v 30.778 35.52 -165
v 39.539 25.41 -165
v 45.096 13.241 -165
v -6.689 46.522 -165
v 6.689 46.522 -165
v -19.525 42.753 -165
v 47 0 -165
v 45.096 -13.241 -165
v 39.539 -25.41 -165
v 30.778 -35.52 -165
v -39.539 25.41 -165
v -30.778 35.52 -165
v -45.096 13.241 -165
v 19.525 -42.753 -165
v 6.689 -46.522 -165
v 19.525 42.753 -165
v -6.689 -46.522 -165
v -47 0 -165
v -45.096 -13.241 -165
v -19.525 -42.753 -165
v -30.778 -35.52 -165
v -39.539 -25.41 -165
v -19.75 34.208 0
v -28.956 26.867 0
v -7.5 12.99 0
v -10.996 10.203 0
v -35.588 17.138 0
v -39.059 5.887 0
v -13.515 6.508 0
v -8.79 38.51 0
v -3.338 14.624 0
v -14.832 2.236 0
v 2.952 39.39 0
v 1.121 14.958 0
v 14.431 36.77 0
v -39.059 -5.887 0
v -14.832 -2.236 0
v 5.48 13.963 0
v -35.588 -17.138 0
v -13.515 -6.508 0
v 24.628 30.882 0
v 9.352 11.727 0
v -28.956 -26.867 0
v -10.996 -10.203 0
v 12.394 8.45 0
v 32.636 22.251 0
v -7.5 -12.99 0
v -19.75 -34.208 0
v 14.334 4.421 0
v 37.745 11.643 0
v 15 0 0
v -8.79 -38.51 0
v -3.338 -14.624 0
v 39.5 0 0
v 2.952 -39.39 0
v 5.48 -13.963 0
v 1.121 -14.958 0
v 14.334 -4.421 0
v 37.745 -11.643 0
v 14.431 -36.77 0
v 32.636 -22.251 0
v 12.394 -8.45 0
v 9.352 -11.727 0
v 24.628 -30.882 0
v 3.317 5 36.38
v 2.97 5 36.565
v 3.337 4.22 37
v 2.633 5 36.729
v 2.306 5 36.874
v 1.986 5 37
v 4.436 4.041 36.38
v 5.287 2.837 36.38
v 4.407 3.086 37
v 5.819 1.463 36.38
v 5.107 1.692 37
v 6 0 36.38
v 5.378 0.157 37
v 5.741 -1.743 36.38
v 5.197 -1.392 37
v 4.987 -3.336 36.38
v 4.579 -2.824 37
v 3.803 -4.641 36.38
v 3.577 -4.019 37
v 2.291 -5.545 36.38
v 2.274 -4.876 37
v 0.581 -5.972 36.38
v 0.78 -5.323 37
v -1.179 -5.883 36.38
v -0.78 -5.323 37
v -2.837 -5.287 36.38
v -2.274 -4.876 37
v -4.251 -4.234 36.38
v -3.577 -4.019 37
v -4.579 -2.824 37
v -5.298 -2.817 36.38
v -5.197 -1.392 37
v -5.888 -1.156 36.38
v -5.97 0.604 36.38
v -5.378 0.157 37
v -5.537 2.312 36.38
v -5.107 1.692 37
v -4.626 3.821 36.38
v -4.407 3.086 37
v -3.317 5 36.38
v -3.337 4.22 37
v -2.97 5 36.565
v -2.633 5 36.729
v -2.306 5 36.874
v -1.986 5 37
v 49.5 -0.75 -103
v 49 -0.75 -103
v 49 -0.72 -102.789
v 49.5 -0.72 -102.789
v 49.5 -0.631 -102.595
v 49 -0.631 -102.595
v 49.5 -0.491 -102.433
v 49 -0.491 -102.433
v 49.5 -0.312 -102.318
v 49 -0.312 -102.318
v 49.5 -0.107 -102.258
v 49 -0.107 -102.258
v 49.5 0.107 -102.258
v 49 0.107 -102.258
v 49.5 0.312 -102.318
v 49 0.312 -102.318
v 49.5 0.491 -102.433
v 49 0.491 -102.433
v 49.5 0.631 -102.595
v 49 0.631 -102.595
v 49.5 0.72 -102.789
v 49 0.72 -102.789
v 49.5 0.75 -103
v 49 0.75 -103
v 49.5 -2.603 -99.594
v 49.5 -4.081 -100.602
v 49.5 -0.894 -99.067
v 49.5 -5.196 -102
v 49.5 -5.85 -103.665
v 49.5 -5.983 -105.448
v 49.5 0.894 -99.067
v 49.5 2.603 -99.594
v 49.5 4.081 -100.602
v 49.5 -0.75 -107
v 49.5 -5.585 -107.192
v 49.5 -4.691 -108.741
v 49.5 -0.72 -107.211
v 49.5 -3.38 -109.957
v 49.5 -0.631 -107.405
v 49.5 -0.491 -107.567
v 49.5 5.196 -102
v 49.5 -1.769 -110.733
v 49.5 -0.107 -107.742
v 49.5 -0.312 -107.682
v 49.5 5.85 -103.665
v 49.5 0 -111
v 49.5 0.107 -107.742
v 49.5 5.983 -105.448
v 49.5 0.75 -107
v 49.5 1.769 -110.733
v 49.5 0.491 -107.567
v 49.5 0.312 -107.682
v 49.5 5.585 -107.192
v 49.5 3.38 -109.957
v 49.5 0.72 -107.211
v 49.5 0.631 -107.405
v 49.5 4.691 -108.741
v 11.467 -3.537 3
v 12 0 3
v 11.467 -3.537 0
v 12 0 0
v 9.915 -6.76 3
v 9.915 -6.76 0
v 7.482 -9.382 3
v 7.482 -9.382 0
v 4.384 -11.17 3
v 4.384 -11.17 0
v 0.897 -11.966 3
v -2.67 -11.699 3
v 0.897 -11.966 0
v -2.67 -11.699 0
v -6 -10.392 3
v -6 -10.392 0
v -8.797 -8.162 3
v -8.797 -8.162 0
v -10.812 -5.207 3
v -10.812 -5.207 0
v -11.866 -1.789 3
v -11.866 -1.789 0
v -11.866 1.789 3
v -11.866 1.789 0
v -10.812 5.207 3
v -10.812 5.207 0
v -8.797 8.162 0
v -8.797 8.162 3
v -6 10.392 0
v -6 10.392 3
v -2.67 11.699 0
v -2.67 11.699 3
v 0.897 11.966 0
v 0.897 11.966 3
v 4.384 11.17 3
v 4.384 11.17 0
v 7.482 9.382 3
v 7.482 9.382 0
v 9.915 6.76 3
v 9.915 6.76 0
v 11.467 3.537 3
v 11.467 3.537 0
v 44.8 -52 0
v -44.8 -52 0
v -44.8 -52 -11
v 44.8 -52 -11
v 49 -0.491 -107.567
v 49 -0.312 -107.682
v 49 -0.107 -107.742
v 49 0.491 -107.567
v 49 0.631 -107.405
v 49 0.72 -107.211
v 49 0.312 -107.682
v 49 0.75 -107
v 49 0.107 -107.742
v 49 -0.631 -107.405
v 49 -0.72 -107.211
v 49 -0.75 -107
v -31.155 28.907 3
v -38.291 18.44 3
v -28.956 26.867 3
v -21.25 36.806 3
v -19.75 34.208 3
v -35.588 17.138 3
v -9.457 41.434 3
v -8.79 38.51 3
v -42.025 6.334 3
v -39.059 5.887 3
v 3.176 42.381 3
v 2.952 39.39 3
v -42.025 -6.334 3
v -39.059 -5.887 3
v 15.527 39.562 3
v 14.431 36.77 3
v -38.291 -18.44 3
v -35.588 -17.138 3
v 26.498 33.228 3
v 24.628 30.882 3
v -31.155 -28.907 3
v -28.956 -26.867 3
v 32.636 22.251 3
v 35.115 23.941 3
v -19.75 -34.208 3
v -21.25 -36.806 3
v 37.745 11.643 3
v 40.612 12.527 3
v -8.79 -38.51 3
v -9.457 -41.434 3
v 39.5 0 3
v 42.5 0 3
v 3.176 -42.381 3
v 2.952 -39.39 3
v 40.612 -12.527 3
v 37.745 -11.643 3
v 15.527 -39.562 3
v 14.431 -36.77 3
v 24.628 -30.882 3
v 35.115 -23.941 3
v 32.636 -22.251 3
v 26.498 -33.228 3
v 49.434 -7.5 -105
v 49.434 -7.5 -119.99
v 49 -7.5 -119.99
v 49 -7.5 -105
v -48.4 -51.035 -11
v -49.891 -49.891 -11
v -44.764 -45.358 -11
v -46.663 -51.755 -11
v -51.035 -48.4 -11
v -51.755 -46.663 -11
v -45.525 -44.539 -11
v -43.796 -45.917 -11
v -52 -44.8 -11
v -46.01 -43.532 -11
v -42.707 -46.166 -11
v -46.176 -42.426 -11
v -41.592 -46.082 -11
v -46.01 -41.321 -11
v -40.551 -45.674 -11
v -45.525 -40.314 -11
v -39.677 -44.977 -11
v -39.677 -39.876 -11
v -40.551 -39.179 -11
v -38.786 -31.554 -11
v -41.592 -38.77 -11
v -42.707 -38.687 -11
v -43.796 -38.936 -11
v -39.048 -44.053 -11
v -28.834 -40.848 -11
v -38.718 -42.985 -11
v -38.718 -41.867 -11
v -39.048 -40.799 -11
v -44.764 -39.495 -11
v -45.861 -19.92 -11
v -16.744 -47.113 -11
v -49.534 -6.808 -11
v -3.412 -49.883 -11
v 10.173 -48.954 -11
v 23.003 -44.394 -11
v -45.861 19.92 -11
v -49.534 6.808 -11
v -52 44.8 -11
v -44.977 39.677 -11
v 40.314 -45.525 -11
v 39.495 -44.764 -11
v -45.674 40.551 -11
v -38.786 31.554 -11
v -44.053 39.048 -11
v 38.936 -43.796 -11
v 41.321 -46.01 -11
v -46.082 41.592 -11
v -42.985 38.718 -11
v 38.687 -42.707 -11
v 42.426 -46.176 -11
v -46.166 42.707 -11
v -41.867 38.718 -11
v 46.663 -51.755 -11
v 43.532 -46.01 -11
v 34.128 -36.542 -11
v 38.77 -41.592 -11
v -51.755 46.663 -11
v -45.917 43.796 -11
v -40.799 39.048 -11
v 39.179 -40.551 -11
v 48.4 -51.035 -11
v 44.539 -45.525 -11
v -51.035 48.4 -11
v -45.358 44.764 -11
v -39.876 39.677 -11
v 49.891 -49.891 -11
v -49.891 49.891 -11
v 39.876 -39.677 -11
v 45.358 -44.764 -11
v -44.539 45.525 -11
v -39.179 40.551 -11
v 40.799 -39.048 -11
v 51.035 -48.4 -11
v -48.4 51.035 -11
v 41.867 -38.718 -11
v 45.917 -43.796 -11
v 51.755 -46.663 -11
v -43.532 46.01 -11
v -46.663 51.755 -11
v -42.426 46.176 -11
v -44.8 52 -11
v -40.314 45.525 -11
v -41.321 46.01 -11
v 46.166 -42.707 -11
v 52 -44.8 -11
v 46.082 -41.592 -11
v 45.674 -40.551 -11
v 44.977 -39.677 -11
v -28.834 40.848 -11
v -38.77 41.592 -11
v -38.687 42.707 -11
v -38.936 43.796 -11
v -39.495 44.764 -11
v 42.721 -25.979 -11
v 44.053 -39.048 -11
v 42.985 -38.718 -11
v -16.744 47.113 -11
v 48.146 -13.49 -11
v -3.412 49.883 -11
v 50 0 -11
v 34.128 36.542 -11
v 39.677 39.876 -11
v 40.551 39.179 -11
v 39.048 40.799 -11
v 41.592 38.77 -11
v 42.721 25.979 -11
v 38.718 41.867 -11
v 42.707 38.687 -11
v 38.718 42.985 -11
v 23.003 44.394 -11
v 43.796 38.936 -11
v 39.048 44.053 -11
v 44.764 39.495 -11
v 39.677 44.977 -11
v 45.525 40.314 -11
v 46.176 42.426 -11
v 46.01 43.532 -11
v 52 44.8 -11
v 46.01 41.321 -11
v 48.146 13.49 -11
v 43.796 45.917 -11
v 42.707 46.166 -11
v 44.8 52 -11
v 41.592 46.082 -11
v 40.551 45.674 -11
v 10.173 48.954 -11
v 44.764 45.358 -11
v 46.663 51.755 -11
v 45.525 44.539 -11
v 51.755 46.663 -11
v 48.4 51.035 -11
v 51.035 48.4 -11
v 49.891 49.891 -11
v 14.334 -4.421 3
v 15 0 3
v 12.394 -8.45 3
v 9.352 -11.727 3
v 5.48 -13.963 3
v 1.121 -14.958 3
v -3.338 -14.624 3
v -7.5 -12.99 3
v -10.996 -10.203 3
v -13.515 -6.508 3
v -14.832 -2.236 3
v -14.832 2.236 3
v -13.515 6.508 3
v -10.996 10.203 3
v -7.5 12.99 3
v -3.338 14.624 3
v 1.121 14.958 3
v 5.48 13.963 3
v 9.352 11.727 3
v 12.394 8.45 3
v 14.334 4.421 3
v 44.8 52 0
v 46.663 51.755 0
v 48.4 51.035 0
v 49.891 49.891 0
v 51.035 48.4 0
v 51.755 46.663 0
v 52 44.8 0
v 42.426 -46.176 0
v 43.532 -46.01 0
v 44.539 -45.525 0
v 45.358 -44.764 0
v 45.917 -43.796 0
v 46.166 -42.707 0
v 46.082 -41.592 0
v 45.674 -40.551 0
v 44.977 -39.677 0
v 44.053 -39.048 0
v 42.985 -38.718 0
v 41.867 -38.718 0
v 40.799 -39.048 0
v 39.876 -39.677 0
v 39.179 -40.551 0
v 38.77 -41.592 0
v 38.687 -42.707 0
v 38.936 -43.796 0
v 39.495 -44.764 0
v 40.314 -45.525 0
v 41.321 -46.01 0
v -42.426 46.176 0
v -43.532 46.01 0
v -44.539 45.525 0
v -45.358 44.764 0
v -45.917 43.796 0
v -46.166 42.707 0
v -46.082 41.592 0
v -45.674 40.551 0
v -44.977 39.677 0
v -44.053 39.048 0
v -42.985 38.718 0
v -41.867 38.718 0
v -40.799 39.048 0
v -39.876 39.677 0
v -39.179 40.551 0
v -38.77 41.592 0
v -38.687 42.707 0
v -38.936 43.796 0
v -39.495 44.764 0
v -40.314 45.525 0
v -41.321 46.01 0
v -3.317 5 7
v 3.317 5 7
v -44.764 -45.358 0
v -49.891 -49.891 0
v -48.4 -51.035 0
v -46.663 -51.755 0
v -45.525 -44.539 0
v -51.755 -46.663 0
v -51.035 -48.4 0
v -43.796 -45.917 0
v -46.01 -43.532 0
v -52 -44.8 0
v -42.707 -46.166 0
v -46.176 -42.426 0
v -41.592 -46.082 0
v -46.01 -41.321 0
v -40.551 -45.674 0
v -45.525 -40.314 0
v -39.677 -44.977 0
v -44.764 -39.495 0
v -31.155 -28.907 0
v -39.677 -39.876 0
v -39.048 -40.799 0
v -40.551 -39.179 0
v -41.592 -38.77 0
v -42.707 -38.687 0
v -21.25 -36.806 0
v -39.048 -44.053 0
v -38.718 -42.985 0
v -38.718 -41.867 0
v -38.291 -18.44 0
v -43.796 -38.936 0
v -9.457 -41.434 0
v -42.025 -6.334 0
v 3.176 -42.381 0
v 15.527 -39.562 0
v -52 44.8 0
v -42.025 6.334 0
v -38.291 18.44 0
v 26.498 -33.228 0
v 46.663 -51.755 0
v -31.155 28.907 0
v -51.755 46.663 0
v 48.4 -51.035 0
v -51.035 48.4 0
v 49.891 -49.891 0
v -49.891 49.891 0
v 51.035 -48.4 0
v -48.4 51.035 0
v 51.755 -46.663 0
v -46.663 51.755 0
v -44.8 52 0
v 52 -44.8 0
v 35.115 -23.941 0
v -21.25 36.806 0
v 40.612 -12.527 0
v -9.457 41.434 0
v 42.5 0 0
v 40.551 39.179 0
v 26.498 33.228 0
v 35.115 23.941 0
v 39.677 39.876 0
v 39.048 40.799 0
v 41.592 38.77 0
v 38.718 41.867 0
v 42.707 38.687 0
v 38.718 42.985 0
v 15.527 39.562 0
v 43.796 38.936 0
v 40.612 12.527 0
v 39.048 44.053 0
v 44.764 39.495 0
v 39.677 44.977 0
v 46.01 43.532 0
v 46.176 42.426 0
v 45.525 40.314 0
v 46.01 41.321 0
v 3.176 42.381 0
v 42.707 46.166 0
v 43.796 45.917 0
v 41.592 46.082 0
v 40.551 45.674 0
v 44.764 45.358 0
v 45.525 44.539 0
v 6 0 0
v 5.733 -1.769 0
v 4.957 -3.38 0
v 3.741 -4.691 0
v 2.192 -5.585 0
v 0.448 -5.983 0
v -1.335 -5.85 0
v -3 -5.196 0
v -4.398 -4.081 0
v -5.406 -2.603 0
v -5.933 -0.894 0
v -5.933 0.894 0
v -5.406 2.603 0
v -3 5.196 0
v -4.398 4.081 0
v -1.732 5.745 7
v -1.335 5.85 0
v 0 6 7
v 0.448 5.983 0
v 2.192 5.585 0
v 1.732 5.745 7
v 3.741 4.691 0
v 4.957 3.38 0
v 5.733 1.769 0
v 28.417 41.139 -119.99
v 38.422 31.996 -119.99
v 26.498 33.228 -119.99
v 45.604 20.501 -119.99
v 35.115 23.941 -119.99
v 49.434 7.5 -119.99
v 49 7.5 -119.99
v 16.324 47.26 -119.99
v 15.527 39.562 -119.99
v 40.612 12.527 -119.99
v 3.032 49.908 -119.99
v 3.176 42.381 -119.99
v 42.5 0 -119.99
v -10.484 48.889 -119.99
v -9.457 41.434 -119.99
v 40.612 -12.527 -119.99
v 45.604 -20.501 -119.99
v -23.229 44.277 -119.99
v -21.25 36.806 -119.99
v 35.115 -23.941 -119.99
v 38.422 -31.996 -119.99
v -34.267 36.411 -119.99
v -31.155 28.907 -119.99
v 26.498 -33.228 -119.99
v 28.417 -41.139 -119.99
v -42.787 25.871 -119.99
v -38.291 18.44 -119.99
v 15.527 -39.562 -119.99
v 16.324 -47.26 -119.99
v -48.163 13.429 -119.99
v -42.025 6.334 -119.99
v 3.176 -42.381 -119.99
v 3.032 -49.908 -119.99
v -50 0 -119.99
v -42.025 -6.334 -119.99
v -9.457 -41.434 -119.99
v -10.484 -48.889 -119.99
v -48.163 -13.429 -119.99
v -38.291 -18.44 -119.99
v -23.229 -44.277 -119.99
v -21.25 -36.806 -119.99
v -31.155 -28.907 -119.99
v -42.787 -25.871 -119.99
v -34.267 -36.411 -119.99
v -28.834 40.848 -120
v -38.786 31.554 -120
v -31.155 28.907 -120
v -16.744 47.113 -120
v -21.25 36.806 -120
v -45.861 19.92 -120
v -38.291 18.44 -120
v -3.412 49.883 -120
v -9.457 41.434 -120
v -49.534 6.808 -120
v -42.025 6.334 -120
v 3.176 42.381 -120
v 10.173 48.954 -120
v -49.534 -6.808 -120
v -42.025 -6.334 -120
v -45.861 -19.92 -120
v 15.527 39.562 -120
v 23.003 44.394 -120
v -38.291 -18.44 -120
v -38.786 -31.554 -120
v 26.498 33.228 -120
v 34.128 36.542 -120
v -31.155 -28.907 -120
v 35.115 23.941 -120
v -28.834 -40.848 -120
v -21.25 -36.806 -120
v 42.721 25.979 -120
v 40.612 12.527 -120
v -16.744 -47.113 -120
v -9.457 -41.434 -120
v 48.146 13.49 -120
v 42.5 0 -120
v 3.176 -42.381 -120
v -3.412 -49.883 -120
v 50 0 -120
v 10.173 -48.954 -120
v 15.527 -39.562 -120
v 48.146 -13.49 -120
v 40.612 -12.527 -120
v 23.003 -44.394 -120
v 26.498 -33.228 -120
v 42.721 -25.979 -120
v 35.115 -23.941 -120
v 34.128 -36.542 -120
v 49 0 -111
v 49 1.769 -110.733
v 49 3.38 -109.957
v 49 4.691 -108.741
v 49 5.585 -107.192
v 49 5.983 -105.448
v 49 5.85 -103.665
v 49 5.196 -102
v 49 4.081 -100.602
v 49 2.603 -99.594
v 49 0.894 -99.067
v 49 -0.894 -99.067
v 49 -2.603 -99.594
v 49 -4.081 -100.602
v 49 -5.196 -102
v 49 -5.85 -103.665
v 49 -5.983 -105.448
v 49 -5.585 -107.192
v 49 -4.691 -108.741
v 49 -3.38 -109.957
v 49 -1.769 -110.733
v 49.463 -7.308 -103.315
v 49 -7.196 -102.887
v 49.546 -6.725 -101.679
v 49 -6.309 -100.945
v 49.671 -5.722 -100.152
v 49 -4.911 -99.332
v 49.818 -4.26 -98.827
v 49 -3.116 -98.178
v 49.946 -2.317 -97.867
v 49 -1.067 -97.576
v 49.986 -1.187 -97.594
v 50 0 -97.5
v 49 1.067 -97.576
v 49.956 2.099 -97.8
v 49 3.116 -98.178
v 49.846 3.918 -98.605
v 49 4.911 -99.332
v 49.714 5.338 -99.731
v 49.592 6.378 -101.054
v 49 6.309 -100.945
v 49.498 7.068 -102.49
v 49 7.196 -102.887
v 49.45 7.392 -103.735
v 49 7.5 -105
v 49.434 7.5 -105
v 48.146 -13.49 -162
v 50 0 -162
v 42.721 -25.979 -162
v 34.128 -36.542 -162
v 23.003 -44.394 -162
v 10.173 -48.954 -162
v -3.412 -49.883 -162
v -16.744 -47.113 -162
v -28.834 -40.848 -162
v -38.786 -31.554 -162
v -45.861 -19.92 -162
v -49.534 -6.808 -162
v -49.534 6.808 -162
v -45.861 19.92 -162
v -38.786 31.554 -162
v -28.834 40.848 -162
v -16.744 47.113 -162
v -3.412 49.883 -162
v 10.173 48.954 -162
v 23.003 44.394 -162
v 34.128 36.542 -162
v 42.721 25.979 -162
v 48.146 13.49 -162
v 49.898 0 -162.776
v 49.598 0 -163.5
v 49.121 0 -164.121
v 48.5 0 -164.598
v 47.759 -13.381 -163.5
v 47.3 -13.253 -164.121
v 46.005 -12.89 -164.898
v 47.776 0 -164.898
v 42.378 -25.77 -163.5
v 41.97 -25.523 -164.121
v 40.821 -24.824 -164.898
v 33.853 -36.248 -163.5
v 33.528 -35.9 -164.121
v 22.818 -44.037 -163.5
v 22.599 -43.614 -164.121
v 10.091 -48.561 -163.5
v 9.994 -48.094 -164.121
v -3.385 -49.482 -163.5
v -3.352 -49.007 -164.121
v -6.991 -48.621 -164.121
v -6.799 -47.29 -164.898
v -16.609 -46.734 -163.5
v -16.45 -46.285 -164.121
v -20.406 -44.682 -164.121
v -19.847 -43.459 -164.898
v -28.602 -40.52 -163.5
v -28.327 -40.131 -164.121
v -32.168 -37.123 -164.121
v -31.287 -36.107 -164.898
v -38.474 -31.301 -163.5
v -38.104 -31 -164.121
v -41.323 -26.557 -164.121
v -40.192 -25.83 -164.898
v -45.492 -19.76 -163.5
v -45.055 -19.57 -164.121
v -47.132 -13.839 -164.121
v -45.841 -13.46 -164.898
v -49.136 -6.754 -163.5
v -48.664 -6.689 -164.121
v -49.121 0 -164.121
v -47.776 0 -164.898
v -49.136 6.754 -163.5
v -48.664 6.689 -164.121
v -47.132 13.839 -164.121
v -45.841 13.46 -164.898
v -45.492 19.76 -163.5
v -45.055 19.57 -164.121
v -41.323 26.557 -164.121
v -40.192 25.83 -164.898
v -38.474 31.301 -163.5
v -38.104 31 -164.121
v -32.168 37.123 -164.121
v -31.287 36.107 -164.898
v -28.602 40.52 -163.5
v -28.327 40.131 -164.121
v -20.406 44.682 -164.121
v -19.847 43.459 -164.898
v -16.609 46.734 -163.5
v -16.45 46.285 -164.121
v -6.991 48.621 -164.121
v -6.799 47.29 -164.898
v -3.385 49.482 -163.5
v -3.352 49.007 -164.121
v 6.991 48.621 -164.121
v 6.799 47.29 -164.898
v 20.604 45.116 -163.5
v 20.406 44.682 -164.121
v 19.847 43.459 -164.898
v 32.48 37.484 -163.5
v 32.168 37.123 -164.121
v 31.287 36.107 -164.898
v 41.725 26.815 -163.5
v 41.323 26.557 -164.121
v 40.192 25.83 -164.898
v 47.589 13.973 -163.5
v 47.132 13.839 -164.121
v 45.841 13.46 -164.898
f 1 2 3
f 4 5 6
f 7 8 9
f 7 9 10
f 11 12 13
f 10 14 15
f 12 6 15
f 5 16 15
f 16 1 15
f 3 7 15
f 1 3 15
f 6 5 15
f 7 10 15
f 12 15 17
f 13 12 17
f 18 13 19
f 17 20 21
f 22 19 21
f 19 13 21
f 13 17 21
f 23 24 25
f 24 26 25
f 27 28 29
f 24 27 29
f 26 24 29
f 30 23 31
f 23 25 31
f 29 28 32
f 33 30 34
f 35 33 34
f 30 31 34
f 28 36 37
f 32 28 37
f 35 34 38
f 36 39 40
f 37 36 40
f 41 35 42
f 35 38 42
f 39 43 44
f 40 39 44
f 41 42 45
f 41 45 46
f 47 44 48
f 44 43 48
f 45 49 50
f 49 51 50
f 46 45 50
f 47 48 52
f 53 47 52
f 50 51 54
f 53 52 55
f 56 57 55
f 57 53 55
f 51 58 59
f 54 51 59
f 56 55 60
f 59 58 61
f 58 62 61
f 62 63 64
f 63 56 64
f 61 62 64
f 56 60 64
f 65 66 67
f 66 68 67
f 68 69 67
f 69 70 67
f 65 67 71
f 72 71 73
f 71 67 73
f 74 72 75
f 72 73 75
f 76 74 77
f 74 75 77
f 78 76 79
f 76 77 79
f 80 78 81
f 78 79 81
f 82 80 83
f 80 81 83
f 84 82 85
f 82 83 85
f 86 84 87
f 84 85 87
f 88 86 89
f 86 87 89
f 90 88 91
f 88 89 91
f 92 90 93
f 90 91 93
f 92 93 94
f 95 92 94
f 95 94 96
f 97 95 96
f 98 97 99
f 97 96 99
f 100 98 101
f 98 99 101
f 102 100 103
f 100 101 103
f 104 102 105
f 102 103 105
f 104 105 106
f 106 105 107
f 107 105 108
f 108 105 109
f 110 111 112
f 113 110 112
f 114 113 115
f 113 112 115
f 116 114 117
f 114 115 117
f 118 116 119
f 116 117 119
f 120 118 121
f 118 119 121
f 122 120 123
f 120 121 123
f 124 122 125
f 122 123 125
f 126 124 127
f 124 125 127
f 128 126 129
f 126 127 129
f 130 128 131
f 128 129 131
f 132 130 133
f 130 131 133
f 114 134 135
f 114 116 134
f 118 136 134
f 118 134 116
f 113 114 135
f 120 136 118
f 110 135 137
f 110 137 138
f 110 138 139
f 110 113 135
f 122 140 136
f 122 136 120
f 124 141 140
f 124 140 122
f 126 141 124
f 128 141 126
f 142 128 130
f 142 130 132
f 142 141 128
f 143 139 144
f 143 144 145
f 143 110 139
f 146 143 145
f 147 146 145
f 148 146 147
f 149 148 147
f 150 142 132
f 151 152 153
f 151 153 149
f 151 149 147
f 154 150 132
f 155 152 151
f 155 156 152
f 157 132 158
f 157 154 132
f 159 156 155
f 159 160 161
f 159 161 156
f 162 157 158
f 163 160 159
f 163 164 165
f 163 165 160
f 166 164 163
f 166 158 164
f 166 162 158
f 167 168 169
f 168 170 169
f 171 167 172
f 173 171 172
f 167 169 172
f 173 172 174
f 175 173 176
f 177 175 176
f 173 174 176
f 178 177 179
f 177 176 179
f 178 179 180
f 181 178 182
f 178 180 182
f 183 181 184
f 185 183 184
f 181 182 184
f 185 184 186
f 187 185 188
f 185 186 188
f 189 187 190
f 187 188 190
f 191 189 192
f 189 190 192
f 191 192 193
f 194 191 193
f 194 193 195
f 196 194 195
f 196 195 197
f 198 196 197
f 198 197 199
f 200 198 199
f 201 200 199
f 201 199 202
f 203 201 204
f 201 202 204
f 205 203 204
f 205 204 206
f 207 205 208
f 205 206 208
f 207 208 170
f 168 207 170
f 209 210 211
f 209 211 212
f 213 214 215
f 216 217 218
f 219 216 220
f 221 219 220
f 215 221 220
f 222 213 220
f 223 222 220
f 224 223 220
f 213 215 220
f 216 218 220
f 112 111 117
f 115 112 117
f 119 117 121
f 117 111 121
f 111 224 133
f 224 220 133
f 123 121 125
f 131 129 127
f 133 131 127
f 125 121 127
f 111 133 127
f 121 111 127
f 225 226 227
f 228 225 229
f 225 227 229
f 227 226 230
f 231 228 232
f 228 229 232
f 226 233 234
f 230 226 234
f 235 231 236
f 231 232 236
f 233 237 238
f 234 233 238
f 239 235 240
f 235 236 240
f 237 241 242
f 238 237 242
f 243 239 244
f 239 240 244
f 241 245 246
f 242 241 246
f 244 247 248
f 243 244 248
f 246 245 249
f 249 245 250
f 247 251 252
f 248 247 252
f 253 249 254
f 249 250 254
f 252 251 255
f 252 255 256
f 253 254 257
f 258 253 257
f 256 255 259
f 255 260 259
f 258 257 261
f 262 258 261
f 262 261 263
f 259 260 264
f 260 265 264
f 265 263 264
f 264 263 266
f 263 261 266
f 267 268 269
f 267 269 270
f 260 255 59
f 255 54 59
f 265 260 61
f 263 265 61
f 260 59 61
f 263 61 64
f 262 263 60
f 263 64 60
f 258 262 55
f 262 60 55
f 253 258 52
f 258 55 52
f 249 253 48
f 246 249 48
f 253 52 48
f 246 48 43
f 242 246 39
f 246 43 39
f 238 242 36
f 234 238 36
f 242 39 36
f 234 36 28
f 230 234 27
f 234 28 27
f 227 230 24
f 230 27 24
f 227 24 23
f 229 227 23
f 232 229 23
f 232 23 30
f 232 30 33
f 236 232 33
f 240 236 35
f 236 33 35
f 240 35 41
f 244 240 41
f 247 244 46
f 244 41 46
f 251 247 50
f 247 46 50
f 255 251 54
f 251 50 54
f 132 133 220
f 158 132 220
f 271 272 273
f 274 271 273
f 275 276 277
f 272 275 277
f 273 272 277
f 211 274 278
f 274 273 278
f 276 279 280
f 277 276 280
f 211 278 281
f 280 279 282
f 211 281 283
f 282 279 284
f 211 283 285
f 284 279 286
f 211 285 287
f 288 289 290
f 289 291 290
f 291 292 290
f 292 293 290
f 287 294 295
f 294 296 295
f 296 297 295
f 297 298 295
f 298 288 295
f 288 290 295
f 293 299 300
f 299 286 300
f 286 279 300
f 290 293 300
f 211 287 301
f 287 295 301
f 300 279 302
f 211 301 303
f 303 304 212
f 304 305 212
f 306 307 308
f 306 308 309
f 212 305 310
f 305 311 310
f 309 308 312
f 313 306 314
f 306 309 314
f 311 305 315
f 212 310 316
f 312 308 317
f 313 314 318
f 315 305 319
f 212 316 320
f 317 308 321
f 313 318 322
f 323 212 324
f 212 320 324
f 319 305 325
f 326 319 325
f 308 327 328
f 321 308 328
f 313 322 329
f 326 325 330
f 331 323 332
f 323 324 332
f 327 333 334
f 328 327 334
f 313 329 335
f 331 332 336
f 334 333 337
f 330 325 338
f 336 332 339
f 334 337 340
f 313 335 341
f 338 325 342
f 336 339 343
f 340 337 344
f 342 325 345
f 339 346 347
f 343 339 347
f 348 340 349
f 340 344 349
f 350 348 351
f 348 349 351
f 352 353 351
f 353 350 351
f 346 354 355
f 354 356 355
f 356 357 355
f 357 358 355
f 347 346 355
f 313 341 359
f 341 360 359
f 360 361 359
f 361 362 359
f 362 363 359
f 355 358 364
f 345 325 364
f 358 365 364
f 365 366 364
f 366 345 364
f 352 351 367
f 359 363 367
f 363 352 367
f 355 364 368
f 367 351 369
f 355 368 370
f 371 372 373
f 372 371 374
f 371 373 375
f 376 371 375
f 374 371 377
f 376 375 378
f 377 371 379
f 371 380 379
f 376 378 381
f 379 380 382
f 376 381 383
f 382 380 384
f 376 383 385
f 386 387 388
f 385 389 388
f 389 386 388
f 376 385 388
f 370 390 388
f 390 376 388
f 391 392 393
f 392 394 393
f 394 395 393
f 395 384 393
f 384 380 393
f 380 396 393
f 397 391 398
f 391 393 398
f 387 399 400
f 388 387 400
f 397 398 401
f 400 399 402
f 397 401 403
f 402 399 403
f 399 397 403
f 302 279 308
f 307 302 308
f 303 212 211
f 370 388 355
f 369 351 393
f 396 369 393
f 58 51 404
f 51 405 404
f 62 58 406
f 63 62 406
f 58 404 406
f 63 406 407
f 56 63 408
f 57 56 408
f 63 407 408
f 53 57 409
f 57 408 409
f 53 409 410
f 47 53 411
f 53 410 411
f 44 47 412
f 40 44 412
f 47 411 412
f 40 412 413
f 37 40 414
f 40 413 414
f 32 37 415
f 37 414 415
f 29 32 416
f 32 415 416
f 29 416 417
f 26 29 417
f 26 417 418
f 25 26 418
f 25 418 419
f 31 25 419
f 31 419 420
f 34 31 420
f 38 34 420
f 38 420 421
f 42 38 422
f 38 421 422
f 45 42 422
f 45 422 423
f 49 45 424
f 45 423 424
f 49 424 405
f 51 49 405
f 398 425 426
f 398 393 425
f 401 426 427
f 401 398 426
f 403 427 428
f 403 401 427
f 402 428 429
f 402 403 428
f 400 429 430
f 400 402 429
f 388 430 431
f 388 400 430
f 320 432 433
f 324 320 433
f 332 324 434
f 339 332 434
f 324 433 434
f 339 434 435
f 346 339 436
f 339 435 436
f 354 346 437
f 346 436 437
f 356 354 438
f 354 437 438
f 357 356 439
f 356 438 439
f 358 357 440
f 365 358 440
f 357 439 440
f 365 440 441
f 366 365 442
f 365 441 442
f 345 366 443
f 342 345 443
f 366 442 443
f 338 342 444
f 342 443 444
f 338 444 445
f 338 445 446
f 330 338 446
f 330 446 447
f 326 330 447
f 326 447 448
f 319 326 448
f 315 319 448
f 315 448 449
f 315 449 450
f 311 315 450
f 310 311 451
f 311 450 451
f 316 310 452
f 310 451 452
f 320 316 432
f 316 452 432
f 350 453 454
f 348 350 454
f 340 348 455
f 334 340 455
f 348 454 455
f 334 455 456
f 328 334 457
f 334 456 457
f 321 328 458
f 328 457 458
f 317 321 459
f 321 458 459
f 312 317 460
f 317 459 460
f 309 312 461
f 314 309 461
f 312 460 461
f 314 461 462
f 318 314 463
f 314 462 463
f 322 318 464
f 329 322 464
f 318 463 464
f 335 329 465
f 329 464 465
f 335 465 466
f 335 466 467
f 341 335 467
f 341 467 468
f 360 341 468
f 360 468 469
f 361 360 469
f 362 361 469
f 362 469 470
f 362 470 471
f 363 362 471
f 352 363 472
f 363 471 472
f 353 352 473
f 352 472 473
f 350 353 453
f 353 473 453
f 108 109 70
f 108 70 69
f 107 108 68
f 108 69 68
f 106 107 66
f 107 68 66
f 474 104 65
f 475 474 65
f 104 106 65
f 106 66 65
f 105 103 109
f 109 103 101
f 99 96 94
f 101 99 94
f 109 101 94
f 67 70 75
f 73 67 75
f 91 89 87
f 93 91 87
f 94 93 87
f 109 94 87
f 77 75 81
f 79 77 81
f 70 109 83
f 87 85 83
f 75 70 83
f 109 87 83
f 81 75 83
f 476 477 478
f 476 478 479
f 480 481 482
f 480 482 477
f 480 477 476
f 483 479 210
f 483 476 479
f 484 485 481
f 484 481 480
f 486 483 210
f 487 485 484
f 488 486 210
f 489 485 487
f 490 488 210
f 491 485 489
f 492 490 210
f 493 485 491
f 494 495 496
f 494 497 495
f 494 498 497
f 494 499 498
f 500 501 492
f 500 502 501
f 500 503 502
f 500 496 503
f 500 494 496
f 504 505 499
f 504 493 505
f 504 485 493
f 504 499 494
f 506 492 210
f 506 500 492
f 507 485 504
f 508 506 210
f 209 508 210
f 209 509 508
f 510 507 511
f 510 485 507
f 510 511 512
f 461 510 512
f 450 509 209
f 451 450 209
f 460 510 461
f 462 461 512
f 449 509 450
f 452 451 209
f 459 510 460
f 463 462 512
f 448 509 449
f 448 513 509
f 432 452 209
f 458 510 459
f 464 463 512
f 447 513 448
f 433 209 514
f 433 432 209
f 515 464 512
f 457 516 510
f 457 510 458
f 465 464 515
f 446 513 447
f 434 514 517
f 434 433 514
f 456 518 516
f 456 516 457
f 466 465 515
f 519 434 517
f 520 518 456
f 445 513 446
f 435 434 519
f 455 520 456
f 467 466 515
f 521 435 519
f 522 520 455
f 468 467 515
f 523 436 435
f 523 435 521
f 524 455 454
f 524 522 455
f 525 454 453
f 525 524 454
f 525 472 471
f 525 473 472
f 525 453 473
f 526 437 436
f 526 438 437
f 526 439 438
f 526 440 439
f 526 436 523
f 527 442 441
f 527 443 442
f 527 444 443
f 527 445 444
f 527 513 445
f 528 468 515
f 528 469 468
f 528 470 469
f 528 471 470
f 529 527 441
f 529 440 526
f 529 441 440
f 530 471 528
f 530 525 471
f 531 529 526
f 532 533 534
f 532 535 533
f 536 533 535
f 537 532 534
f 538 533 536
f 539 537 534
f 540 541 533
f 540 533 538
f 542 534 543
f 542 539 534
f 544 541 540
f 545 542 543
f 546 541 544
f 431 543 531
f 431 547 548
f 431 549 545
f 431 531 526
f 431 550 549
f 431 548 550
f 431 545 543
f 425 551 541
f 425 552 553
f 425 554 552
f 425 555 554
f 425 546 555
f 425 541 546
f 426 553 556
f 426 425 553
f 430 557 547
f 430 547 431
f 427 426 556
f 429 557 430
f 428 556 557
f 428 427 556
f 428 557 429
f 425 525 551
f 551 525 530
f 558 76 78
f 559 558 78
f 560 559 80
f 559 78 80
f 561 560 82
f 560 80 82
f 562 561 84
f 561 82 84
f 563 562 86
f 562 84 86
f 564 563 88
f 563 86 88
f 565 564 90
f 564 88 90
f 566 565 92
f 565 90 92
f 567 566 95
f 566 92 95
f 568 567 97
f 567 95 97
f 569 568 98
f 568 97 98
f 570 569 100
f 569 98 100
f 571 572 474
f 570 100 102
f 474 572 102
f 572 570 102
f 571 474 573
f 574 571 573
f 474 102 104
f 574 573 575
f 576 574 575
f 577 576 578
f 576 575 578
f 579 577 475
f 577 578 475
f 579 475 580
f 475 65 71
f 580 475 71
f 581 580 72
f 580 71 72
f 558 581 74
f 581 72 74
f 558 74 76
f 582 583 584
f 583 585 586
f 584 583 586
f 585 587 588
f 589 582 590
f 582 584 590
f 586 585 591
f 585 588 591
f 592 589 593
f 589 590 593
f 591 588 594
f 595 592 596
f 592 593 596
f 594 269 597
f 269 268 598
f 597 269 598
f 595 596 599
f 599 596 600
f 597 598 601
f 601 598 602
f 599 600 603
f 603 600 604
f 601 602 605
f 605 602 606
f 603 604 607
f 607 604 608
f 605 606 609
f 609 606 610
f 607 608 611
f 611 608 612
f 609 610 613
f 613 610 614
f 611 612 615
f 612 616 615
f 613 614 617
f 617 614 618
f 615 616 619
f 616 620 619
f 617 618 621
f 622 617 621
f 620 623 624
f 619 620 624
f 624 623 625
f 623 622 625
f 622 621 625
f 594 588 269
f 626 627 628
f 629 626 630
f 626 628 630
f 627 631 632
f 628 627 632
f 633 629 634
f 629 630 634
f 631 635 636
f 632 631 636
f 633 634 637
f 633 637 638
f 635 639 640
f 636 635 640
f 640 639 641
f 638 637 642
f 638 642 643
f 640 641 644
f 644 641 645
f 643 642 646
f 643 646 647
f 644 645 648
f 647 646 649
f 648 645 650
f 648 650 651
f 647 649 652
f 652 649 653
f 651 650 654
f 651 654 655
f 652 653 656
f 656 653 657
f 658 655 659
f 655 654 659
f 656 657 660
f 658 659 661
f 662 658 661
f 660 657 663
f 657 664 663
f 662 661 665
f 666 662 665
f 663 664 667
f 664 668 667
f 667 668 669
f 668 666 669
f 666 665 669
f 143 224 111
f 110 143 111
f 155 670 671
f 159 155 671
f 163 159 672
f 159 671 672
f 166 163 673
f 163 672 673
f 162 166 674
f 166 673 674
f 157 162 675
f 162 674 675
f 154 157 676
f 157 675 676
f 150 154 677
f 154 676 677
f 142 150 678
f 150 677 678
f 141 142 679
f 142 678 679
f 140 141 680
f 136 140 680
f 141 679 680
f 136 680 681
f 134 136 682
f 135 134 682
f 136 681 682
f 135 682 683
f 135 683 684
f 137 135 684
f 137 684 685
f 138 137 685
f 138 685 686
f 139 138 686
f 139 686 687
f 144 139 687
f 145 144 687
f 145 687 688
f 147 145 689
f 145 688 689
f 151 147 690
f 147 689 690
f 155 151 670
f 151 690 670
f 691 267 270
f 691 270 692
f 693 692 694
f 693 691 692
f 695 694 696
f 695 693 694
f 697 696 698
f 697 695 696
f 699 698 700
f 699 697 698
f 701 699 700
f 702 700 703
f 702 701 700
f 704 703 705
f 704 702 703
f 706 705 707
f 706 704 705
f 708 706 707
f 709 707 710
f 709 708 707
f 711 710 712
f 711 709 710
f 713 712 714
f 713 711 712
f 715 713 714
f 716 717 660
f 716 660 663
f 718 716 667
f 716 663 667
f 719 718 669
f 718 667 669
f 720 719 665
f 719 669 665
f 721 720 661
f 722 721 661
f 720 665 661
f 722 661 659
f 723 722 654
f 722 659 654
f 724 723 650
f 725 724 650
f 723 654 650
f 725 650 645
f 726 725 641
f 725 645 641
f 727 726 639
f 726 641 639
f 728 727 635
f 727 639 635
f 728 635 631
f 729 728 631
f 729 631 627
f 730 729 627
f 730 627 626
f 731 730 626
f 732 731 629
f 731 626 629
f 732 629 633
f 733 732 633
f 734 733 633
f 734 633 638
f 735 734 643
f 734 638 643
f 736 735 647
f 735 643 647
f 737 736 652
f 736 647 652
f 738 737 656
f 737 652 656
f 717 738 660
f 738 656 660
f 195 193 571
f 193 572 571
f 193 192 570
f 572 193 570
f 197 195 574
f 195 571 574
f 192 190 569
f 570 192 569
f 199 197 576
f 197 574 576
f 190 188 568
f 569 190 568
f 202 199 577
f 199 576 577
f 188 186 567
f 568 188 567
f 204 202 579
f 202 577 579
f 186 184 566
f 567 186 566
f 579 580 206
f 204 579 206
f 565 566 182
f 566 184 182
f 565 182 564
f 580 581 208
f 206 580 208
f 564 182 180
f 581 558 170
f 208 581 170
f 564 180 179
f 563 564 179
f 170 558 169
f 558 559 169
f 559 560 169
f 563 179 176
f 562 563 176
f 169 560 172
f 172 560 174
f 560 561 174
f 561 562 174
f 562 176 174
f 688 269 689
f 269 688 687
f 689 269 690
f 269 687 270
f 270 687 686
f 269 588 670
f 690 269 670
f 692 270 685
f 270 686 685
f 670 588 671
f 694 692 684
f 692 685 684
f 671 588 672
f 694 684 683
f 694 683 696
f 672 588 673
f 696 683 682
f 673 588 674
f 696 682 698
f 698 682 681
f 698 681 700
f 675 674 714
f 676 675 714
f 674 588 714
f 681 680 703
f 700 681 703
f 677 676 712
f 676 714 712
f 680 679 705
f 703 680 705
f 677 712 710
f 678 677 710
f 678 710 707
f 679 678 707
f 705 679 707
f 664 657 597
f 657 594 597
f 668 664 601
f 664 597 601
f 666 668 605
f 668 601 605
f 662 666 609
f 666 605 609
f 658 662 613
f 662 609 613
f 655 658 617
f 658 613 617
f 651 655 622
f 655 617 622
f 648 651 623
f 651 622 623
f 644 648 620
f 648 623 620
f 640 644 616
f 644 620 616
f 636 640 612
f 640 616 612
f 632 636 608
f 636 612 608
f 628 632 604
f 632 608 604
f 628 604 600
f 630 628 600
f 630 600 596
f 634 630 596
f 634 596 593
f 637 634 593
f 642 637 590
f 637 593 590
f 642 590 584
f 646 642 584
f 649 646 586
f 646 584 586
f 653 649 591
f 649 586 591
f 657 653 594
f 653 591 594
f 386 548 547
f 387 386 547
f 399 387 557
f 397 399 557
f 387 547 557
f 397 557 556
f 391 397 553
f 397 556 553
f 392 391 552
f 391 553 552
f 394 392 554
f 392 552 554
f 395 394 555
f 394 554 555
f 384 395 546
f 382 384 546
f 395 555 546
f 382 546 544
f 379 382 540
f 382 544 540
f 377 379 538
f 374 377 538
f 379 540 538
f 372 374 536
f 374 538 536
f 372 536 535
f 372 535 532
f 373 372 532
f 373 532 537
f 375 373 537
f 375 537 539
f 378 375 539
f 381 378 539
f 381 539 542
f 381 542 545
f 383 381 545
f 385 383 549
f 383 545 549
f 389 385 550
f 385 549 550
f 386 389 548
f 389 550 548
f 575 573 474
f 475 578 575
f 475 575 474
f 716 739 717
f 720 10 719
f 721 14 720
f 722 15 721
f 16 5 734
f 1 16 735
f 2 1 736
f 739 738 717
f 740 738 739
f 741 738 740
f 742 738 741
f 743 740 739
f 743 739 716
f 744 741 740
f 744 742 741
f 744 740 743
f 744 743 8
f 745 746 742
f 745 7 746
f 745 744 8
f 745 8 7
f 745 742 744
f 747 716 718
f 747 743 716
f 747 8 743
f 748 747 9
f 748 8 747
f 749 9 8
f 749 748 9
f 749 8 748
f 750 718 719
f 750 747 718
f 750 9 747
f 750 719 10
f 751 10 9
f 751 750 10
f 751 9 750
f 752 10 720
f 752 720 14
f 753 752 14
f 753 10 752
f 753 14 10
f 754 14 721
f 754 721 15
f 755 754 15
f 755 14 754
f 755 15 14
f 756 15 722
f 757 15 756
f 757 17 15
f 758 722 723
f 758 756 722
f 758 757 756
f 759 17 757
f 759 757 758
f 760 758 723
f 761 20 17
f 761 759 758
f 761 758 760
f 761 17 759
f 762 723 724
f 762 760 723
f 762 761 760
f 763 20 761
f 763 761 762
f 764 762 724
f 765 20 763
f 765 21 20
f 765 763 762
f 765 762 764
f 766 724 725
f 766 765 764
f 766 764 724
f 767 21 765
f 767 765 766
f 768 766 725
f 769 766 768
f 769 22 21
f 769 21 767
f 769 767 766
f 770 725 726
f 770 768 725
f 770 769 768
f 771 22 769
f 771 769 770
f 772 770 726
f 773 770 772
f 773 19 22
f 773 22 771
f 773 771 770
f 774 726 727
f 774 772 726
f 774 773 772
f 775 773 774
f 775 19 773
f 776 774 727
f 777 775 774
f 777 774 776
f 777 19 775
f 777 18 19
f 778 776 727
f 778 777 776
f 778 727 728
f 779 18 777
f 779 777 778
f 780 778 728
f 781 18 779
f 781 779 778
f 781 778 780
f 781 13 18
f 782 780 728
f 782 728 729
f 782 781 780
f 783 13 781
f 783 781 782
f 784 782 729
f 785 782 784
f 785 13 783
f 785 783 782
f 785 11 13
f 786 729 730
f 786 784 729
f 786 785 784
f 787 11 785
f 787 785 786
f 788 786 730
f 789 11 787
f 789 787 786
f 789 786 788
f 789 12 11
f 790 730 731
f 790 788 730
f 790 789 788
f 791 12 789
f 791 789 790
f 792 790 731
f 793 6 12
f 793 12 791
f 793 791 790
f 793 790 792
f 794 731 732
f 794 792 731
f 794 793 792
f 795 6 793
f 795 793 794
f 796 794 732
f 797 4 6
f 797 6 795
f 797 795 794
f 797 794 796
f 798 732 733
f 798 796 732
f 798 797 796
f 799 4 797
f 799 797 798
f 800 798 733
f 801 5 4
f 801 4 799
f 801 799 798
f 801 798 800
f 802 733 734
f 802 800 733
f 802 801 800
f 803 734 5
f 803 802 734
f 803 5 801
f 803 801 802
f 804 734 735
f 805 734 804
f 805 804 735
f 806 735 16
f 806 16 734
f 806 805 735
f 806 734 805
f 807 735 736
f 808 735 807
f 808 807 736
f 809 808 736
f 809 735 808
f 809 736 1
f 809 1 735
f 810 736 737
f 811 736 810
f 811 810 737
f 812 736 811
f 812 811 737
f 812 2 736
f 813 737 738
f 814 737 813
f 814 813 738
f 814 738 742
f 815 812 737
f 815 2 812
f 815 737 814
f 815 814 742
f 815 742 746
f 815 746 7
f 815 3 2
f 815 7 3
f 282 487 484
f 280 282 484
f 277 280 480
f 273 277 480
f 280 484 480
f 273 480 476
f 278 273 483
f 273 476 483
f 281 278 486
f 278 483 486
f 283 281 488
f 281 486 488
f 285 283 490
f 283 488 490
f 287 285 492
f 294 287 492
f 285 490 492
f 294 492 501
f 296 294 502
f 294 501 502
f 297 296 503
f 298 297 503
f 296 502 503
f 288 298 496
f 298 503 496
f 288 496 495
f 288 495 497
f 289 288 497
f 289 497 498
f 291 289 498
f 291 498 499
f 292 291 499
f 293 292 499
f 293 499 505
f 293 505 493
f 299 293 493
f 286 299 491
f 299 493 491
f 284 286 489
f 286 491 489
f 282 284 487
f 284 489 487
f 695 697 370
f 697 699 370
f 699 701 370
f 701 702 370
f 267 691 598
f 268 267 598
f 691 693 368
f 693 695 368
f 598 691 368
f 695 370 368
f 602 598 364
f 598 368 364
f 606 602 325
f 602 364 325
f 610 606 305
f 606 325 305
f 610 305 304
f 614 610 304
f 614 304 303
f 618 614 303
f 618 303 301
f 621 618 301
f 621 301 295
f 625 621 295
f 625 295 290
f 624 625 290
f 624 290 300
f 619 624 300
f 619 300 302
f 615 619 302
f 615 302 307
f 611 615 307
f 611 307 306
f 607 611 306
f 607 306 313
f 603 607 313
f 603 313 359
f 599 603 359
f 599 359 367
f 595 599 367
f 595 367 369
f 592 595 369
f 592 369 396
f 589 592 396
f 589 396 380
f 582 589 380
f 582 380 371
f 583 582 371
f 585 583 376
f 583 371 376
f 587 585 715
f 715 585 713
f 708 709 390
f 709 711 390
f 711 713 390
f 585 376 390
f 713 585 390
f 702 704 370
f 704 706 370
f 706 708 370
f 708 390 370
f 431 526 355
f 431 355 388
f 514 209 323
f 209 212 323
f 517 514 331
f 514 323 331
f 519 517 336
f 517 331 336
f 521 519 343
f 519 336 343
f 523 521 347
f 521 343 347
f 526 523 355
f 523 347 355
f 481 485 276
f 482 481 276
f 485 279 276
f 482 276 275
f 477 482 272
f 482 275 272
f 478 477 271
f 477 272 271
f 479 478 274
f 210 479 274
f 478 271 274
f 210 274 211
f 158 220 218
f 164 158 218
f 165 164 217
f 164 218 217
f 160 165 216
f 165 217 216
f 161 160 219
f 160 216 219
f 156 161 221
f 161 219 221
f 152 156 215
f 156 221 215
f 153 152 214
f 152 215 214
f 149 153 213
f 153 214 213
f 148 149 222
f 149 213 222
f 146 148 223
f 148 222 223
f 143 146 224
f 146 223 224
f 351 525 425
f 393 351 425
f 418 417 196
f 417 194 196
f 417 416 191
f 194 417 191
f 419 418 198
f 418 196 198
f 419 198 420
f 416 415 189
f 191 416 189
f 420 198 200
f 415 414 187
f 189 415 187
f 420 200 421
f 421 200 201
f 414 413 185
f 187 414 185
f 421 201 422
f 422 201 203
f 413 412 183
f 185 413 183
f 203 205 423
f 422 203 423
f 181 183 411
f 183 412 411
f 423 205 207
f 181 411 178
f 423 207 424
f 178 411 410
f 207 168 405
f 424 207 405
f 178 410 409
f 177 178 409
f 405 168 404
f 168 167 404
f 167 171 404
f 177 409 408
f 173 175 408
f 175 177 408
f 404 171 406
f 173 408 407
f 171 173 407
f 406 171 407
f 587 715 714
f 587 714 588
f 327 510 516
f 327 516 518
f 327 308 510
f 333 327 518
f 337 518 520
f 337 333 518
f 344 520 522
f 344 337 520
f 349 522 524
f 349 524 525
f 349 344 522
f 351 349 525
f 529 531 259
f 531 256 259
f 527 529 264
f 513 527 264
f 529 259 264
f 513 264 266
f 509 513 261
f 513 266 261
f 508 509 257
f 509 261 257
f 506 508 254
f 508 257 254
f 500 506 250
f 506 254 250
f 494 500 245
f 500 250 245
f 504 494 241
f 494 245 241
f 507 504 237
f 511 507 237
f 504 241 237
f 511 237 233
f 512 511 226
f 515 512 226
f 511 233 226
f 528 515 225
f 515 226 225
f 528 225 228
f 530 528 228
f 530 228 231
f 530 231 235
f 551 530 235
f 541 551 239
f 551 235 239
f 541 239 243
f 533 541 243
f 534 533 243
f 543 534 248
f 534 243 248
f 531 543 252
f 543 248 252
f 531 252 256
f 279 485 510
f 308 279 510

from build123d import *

# Parameters (mm, degrees)
SKETCH_3_W               = 104
SKETCH_3_H               = 104
EXTRUDE_1_DEPTH          = 11
SKETCH_4_R               = 3.75
CUT_EXTRUDE_1_DEPTH      = 11
PATTERN_CIRCULAR_1_COUNT = 4
FILLET_1_R               = 7.2
SKETCH_5_W               = 6.63324958
SKETCH_5_H               = 1
CUT_EXTRUDE_2_DEPTH      = 30
FILLET_2_R               = 3
CUT_EXTRUDE_START        = 50
CUT_EXTRUDE_3_DEPTH      = 1
SKETCH_7_R               = 6
EXTRUDE_2_DEPTH          = 0.5
CHAMFER_2_SIZE           = 0.62
MOVE_BODY_1_ANGLE        = 90


with BuildPart() as part:
    # 草图2 → 旋转1 (revolve)
    with BuildSketch(Plane.XY, mode=Mode.PRIVATE) as revolve_1_sk:
        Polygon((0, 15), (-3, 15), (-3, 12), (0, 12), (0, 6), (-37, 6), (-37, 0), (165, 0), (165, 50), (120, 50), (120, 42.5), (119.99, 42.5), (119.99, 50), (0, 50), (0, 42.5), (-3, 42.5), (-3, 39.5), (0, 39.5), align=None)
    revolve(revolve_1_sk.sketch.rotate(Axis((-37, 0, 0), (1, 0, 0)), 90), axis=Axis((-37, 0, 0), (1, 0, 0)))

    # 草图3 → 凸台-拉伸1 (add)
    with BuildSketch(Plane.ZY):
        Rectangle(SKETCH_3_W, SKETCH_3_H)
    extrude(amount=-EXTRUDE_1_DEPTH)

    # 草图4 → 切除-拉伸1 (cut)
    with BuildSketch(Plane.ZY):
        with Locations((42.426406871, 42.426406871)):
            Circle(SKETCH_4_R)
    cut_extrude_1 = extrude(amount=-CUT_EXTRUDE_1_DEPTH, mode=Mode.SUBTRACT)

    # 阵列(圆周)1: 切除-拉伸1 ×4 about axis
    pattern_circular_1_axis = Axis((0, 0, 0), (1, 0, 0))
    for i in range(1, PATTERN_CIRCULAR_1_COUNT):
        add(cut_extrude_1.rotate(pattern_circular_1_axis, i * 360 / PATTERN_CIRCULAR_1_COUNT), mode=Mode.SUBTRACT)

    # 圆角1
    fillet_1_edges = [part.edges().sort_by_distance(p)[0] for p in [
        (5.5, -52, -52),
        (5.5, 52, -52),
        (5.5, 52, 52),
        (5.5, -52, 52),
    ]]
    fillet(fillet_1_edges, radius=FILLET_1_R)

    # 草图5 → 切除-拉伸2 (cut)
    with BuildSketch(Plane.ZY.offset(37)):
        with Locations((0, 5.5)):
            Rectangle(SKETCH_5_W, SKETCH_5_H)
    extrude(amount=-CUT_EXTRUDE_2_DEPTH, mode=Mode.SUBTRACT)

    # 圆角2
    fillet_2_edges = [part.edges().sort_by_distance(p)[0] for p in [
        (165, 0, -50),
    ]]
    fillet(fillet_2_edges, radius=FILLET_2_R)

    # 草图6 → 切除-拉伸3 (cut)
    with BuildSketch(Plane.XY.offset(CUT_EXTRUDE_START)):
        with BuildLine():
            Line((105, 7.5), (120, 7.5))
            Line((120, 7.5), (120, -7.5))
            Line((120, -7.5), (105, -7.5))
            ThreePointArc((105, -7.5), (97.5, 0), (105, 7.5))
        make_face()
    extrude(amount=-CUT_EXTRUDE_3_DEPTH, mode=Mode.SUBTRACT)

    # 草图7 → 凸台-拉伸2 (add)
    with BuildSketch(Plane.XY.offset(49)):
        with Locations((105, 0)):
            Circle(SKETCH_7_R)
        with BuildLine():
            Line((103, 0.75), (107, 0.75))
            ThreePointArc((107, 0.75), (107.75, 0), (107, -0.75))
            Line((107, -0.75), (103, -0.75))
            ThreePointArc((103, -0.75), (102.25, 0), (103, 0.75))
        make_face(mode=Mode.SUBTRACT)
    extrude(amount=EXTRUDE_2_DEPTH)

    # 倒角2
    chamfer_2_edges = [part.edges().sort_by_distance(p)[0] for p in [
        (-37, -5.286764074, -2.837274331),
    ]]
    chamfer(chamfer_2_edges, length=CHAMFER_2_SIZE)


with BuildPart() as part_1:
    # Move Body 1: moved
    add(part.part.rotate(Axis((0, 0, 0), (0, 1, 0)), MOVE_BODY_1_ANGLE))


solid = part_1.part
